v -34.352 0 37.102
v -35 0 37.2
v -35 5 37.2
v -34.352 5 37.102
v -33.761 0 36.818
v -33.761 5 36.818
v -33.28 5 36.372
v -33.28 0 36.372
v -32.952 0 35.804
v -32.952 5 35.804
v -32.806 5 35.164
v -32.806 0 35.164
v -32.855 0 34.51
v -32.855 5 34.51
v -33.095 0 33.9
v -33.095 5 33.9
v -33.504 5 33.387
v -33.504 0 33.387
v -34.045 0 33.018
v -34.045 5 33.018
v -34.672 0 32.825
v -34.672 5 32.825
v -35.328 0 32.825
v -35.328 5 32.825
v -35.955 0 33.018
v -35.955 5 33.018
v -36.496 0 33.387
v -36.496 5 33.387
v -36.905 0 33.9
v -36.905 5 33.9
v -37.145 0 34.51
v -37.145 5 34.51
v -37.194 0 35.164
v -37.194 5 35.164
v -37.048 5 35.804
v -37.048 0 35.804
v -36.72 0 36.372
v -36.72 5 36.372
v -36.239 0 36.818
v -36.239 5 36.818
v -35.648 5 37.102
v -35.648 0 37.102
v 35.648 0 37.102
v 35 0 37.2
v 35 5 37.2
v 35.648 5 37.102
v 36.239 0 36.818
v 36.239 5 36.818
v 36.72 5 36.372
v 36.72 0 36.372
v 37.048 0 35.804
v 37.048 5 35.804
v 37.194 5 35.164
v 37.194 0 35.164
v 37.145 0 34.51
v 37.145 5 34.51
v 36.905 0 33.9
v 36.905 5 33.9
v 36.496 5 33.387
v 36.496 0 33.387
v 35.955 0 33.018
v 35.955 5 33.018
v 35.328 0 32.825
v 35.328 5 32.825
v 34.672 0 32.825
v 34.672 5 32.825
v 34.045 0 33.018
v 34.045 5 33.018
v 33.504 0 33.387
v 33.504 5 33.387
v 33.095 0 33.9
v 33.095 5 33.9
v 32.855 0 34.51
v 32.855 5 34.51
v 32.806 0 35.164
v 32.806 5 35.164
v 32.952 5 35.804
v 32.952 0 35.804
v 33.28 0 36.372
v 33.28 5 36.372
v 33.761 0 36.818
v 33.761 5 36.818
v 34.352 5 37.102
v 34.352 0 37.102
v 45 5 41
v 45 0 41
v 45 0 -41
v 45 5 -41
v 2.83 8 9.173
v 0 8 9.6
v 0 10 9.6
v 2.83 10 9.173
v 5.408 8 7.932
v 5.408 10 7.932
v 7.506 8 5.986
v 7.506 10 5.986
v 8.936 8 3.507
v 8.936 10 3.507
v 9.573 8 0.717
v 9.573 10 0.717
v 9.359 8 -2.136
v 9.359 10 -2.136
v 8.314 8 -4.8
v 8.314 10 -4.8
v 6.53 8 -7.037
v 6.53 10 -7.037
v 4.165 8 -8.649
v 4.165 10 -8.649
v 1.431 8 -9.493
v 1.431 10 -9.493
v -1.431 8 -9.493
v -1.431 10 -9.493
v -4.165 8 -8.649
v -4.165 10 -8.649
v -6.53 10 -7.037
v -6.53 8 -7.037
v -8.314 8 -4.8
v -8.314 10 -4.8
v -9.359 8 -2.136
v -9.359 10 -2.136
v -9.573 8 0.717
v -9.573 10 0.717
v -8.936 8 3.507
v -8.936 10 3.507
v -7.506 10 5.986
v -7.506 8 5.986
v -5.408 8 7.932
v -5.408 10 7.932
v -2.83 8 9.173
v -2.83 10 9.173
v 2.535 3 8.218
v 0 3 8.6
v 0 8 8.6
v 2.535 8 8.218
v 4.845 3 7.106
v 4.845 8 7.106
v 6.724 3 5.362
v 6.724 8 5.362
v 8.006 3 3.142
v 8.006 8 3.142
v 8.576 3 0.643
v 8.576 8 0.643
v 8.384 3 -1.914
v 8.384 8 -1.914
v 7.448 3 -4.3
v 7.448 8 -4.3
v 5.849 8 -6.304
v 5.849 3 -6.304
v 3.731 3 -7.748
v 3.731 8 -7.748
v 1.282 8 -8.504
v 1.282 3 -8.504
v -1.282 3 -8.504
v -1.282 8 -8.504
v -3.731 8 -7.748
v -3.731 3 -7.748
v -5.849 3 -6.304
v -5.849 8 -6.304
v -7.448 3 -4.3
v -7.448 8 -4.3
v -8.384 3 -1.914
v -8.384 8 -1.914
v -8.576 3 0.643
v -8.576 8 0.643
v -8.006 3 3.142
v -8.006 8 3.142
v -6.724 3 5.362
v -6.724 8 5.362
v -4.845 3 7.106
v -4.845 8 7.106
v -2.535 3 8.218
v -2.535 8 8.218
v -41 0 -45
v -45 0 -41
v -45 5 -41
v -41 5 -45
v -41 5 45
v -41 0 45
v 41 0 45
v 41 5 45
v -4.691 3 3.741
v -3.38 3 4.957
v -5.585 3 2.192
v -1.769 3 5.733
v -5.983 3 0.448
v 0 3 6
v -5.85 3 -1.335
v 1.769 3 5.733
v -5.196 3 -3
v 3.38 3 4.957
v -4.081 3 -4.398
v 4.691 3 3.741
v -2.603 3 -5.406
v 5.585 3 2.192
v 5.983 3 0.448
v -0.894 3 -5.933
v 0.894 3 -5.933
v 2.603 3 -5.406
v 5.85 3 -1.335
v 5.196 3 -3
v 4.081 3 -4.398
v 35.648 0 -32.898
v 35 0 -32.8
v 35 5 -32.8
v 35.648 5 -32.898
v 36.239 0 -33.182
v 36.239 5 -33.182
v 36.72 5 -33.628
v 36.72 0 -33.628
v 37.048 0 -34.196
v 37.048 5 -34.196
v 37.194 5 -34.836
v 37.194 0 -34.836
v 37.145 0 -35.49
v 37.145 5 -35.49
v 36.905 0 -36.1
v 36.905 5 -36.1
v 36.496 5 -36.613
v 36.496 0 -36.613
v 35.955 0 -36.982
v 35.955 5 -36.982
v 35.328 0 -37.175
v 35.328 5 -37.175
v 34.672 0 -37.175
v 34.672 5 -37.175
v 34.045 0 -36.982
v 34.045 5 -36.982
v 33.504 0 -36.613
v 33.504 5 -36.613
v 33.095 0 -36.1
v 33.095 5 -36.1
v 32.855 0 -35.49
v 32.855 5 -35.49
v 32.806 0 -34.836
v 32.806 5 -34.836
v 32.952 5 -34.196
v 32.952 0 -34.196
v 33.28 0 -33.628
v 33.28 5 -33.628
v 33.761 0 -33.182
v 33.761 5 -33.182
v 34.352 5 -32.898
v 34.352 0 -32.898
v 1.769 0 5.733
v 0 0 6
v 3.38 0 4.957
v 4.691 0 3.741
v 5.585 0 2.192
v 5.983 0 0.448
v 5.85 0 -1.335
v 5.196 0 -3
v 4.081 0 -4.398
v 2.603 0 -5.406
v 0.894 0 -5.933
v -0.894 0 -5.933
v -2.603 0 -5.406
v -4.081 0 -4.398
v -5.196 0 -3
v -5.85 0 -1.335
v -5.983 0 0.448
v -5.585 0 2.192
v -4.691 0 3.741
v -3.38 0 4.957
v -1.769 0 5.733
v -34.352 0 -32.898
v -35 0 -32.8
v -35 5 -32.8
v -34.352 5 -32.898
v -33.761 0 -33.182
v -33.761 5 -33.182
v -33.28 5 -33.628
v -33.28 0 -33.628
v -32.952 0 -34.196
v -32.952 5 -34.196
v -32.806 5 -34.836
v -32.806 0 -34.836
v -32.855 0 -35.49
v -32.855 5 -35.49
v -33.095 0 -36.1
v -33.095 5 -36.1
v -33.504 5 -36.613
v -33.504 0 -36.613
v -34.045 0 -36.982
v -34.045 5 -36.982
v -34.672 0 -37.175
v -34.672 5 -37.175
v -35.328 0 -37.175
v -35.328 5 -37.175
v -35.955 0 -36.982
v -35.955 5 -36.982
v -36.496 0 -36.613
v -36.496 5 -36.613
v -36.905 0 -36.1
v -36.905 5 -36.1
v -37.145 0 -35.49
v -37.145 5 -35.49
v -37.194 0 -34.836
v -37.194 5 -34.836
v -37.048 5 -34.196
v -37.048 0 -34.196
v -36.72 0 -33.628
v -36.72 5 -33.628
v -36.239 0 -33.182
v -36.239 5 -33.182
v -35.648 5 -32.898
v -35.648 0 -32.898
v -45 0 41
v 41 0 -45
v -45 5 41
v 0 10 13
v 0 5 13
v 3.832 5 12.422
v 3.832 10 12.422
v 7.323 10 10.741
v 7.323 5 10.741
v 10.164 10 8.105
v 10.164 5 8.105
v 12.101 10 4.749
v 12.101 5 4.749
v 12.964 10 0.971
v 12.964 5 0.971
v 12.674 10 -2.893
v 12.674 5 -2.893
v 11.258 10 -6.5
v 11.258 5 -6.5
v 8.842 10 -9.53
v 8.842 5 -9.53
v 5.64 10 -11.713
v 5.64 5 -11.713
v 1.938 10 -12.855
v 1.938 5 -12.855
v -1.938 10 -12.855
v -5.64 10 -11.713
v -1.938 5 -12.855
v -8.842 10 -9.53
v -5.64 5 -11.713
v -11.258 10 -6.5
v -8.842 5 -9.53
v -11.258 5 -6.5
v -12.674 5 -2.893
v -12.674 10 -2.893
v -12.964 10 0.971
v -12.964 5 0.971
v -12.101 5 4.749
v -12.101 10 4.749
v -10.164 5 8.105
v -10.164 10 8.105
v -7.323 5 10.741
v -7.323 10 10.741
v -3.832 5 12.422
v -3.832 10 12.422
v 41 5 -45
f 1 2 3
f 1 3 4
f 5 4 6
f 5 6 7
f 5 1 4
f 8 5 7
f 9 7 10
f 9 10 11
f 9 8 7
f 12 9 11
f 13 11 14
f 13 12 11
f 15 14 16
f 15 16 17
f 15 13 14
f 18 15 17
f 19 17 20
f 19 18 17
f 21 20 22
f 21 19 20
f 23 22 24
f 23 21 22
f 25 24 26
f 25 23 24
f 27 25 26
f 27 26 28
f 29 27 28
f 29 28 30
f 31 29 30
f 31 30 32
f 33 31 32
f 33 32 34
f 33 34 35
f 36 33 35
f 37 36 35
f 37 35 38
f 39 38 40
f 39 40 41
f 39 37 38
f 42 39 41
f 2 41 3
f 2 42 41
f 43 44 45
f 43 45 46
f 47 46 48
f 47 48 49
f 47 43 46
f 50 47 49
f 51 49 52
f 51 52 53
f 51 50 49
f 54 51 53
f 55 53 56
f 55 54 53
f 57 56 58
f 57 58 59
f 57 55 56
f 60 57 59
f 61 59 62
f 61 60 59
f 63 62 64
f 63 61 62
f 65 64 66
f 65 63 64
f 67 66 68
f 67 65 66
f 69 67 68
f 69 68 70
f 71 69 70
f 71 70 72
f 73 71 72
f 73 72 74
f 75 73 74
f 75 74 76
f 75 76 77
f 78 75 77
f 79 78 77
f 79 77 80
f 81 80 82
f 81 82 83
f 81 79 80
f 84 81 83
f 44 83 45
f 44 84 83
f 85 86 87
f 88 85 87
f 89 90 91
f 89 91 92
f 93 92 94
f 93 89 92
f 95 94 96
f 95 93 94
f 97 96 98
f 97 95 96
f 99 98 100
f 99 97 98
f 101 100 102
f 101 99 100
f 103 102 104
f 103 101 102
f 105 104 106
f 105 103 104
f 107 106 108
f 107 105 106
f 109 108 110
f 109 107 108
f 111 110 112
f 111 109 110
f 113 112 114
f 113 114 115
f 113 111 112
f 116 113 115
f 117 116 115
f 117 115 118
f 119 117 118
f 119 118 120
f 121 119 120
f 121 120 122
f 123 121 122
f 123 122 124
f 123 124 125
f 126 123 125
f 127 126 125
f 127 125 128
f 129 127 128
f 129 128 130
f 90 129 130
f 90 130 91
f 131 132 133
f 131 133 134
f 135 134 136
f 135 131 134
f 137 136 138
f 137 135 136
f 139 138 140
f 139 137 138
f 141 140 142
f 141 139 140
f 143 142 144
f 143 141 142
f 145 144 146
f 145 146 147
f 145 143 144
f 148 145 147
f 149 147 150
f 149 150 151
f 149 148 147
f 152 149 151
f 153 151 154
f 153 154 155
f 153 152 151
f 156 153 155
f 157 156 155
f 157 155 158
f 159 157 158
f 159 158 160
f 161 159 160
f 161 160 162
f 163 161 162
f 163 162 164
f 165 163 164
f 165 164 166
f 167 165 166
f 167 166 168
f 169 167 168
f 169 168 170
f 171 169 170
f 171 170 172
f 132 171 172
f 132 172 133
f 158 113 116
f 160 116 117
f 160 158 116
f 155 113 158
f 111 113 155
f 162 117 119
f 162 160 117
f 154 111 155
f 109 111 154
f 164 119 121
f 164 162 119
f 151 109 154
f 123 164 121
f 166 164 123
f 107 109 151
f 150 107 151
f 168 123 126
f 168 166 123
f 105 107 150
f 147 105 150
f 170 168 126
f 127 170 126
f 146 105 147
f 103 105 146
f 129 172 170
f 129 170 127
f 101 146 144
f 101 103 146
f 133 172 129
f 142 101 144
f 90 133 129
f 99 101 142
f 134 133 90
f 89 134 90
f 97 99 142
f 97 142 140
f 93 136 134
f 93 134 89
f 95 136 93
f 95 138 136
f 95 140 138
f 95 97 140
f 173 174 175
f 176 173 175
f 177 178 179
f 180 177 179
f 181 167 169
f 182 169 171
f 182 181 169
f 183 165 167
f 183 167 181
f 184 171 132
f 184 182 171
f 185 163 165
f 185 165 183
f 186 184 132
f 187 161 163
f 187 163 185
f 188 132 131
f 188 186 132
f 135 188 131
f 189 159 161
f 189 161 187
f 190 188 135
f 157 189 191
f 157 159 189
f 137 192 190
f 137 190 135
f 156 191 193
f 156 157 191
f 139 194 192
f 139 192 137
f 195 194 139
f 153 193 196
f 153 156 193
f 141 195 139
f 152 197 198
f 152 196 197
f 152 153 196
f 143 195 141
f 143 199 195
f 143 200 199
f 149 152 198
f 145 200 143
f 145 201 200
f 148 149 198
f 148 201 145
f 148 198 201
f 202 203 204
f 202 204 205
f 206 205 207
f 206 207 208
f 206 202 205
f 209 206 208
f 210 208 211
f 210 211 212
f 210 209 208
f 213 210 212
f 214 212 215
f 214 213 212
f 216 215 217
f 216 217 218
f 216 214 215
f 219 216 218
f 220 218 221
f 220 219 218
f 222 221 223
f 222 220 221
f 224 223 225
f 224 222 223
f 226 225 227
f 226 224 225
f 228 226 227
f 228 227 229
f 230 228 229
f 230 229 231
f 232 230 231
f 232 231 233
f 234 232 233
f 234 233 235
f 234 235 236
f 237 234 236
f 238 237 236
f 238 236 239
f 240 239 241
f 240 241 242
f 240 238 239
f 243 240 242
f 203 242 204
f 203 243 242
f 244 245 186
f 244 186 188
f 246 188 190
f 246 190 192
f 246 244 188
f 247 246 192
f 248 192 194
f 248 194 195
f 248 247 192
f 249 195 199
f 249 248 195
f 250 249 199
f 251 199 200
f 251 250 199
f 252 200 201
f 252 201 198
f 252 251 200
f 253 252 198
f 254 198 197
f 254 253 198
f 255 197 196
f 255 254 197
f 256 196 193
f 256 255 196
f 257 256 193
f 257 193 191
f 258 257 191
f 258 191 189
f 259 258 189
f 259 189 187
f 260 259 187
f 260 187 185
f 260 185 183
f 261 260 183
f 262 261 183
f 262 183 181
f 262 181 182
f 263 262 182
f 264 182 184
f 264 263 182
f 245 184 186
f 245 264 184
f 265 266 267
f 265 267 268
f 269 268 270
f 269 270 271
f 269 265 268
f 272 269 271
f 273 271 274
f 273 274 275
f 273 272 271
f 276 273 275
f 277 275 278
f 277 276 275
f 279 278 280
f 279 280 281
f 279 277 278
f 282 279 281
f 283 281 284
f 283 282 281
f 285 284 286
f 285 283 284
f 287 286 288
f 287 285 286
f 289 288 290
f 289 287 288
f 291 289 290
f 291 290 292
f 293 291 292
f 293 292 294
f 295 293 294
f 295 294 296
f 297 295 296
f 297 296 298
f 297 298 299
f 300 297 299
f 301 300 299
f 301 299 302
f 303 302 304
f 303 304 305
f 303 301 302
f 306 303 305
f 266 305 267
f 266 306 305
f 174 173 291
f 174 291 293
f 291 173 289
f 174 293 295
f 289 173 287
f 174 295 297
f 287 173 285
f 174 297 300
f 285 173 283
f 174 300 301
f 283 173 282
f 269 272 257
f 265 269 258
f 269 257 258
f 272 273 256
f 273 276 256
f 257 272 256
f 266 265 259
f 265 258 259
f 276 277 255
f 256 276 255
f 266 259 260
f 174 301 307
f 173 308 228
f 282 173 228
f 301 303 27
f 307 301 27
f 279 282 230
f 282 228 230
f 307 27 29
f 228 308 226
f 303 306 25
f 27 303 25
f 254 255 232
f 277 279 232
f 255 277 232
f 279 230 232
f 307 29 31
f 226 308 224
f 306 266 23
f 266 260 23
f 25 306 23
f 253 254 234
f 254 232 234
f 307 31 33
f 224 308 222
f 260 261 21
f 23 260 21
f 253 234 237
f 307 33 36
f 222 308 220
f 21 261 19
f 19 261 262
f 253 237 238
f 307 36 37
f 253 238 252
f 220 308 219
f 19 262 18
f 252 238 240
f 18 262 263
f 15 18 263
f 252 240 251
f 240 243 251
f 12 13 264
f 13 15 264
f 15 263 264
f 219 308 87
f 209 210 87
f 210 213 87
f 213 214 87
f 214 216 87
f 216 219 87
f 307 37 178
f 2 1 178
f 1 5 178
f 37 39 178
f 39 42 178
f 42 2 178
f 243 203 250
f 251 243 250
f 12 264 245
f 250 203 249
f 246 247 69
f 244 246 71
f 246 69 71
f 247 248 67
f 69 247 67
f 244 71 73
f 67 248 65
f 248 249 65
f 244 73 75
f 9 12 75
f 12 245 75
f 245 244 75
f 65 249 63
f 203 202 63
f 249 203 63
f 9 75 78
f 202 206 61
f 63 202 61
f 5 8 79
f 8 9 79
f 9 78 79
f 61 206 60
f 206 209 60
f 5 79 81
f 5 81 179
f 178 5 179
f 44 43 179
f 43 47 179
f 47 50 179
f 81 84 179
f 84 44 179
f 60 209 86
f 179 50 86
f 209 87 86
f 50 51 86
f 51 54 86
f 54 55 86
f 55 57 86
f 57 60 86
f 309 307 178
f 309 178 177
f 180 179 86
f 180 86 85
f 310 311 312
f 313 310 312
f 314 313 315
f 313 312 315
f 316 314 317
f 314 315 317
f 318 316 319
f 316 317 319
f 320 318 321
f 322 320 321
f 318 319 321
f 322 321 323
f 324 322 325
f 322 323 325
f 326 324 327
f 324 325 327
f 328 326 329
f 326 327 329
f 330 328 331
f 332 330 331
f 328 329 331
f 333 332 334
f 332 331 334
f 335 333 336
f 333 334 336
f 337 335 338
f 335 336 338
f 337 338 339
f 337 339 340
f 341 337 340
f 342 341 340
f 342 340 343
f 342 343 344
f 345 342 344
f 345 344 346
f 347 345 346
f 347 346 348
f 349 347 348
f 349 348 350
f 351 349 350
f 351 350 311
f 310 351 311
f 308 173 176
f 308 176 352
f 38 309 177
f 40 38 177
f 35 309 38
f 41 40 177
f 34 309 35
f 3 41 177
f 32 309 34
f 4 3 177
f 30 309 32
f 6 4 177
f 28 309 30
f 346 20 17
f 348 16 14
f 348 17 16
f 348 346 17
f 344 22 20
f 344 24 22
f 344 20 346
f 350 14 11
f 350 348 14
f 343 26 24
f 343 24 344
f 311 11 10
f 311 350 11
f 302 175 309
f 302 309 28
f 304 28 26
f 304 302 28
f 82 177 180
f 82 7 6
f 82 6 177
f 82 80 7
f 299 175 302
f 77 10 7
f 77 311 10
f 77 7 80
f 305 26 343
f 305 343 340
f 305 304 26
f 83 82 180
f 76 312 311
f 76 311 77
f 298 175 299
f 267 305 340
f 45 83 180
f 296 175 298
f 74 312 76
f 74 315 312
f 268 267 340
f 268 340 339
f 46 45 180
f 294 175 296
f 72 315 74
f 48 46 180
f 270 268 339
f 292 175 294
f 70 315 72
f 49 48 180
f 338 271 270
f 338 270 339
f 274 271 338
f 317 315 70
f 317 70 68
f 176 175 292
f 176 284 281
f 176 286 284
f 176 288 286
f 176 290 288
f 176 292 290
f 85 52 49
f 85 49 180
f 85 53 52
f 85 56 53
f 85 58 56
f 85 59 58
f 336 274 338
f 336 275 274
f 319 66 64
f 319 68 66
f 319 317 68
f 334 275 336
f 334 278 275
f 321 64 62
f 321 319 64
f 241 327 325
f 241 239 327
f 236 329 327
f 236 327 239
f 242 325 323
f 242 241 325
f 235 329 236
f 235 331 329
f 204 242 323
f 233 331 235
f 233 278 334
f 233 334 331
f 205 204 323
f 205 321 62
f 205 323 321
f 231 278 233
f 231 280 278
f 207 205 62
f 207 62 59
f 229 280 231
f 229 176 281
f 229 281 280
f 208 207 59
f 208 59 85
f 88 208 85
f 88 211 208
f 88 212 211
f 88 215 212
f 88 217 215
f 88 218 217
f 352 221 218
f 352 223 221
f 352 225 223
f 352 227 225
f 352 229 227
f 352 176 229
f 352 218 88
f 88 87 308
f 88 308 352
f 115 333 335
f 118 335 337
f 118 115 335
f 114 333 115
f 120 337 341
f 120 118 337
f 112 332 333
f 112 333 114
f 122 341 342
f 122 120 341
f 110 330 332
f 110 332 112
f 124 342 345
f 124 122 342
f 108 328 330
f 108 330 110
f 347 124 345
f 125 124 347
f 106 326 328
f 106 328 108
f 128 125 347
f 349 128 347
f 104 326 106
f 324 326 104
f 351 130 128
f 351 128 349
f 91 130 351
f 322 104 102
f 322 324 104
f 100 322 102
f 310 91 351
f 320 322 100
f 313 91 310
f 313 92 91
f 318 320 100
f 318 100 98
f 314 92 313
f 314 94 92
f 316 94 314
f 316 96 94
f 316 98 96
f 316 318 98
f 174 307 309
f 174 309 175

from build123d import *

# Parameters (mm, degrees)
SKETCH1_W           = 90
SKETCH1_H           = 90
SKETCH1_R           = 2.2
SKETCH1_R_2         = 13
BOSS_EXTRUDE1_DEPTH = 5
SKETCH1_3_R         = 13
SKETCH1_3_R_2       = 6
BOSS_EXTRUDE2_DEPTH = 3
SKETCH1_4_R         = 13
SKETCH1_4_R_2       = 8.6
BOSS_EXTRUDE3_DEPTH = 8
SKETCH1_5_R         = 13
SKETCH1_5_R_2       = 9.6
BOSS_EXTRUDE4_DEPTH = 10
CHAMFER1_SIZE       = 4


with BuildPart() as part:
    # Sketch1 → Boss-Extrude1 (new body)
    with BuildSketch(Plane(origin=(0, 0, 0), x_dir=(1, 0, 0), z_dir=(0, 1, 0))):
        Rectangle(SKETCH1_W, SKETCH1_H)
        with Locations((-35, -35)):
            Circle(SKETCH1_R, mode=Mode.SUBTRACT)
        with Locations((35, -35)):
            Circle(SKETCH1_R, mode=Mode.SUBTRACT)
        with Locations((-35, 35)):
            Circle(SKETCH1_R, mode=Mode.SUBTRACT)
        Circle(SKETCH1_R_2, mode=Mode.SUBTRACT)
        with Locations((35, 35)):
            Circle(SKETCH1_R, mode=Mode.SUBTRACT)
    extrude(amount=BOSS_EXTRUDE1_DEPTH)

    # Sketch1<3> → Boss-Extrude2 (add)
    with BuildSketch(Plane(origin=(0, 0, 0), x_dir=(1, 0, 0), z_dir=(0, 1, 0))):
        Circle(SKETCH1_3_R)
        Circle(SKETCH1_3_R_2, mode=Mode.SUBTRACT)
    extrude(amount=BOSS_EXTRUDE2_DEPTH)

    # Sketch1<4> → Boss-Extrude3 (add)
    with BuildSketch(Plane(origin=(0, 0, 0), x_dir=(1, 0, 0), z_dir=(0, 1, 0))):
        Circle(SKETCH1_4_R)
        Circle(SKETCH1_4_R_2, mode=Mode.SUBTRACT)
    extrude(amount=BOSS_EXTRUDE3_DEPTH)

    # Sketch1<5> → Boss-Extrude4 (add)
    with BuildSketch(Plane(origin=(0, 0, 0), x_dir=(1, 0, 0), z_dir=(0, 1, 0))):
        Circle(SKETCH1_5_R)
        Circle(SKETCH1_5_R_2, mode=Mode.SUBTRACT)
    extrude(amount=BOSS_EXTRUDE4_DEPTH)

    # Chamfer1
    chamfer1_edges = [part.edges().sort_by_distance(p)[0] for p in [
        (-45, 2.5, -45),
        (45, 2.5, -45),
        (-45, 2.5, 45),
        (45, 2.5, 45),
    ]]
    chamfer(chamfer1_edges, length=CHAMFER1_SIZE)


solid = part.part
